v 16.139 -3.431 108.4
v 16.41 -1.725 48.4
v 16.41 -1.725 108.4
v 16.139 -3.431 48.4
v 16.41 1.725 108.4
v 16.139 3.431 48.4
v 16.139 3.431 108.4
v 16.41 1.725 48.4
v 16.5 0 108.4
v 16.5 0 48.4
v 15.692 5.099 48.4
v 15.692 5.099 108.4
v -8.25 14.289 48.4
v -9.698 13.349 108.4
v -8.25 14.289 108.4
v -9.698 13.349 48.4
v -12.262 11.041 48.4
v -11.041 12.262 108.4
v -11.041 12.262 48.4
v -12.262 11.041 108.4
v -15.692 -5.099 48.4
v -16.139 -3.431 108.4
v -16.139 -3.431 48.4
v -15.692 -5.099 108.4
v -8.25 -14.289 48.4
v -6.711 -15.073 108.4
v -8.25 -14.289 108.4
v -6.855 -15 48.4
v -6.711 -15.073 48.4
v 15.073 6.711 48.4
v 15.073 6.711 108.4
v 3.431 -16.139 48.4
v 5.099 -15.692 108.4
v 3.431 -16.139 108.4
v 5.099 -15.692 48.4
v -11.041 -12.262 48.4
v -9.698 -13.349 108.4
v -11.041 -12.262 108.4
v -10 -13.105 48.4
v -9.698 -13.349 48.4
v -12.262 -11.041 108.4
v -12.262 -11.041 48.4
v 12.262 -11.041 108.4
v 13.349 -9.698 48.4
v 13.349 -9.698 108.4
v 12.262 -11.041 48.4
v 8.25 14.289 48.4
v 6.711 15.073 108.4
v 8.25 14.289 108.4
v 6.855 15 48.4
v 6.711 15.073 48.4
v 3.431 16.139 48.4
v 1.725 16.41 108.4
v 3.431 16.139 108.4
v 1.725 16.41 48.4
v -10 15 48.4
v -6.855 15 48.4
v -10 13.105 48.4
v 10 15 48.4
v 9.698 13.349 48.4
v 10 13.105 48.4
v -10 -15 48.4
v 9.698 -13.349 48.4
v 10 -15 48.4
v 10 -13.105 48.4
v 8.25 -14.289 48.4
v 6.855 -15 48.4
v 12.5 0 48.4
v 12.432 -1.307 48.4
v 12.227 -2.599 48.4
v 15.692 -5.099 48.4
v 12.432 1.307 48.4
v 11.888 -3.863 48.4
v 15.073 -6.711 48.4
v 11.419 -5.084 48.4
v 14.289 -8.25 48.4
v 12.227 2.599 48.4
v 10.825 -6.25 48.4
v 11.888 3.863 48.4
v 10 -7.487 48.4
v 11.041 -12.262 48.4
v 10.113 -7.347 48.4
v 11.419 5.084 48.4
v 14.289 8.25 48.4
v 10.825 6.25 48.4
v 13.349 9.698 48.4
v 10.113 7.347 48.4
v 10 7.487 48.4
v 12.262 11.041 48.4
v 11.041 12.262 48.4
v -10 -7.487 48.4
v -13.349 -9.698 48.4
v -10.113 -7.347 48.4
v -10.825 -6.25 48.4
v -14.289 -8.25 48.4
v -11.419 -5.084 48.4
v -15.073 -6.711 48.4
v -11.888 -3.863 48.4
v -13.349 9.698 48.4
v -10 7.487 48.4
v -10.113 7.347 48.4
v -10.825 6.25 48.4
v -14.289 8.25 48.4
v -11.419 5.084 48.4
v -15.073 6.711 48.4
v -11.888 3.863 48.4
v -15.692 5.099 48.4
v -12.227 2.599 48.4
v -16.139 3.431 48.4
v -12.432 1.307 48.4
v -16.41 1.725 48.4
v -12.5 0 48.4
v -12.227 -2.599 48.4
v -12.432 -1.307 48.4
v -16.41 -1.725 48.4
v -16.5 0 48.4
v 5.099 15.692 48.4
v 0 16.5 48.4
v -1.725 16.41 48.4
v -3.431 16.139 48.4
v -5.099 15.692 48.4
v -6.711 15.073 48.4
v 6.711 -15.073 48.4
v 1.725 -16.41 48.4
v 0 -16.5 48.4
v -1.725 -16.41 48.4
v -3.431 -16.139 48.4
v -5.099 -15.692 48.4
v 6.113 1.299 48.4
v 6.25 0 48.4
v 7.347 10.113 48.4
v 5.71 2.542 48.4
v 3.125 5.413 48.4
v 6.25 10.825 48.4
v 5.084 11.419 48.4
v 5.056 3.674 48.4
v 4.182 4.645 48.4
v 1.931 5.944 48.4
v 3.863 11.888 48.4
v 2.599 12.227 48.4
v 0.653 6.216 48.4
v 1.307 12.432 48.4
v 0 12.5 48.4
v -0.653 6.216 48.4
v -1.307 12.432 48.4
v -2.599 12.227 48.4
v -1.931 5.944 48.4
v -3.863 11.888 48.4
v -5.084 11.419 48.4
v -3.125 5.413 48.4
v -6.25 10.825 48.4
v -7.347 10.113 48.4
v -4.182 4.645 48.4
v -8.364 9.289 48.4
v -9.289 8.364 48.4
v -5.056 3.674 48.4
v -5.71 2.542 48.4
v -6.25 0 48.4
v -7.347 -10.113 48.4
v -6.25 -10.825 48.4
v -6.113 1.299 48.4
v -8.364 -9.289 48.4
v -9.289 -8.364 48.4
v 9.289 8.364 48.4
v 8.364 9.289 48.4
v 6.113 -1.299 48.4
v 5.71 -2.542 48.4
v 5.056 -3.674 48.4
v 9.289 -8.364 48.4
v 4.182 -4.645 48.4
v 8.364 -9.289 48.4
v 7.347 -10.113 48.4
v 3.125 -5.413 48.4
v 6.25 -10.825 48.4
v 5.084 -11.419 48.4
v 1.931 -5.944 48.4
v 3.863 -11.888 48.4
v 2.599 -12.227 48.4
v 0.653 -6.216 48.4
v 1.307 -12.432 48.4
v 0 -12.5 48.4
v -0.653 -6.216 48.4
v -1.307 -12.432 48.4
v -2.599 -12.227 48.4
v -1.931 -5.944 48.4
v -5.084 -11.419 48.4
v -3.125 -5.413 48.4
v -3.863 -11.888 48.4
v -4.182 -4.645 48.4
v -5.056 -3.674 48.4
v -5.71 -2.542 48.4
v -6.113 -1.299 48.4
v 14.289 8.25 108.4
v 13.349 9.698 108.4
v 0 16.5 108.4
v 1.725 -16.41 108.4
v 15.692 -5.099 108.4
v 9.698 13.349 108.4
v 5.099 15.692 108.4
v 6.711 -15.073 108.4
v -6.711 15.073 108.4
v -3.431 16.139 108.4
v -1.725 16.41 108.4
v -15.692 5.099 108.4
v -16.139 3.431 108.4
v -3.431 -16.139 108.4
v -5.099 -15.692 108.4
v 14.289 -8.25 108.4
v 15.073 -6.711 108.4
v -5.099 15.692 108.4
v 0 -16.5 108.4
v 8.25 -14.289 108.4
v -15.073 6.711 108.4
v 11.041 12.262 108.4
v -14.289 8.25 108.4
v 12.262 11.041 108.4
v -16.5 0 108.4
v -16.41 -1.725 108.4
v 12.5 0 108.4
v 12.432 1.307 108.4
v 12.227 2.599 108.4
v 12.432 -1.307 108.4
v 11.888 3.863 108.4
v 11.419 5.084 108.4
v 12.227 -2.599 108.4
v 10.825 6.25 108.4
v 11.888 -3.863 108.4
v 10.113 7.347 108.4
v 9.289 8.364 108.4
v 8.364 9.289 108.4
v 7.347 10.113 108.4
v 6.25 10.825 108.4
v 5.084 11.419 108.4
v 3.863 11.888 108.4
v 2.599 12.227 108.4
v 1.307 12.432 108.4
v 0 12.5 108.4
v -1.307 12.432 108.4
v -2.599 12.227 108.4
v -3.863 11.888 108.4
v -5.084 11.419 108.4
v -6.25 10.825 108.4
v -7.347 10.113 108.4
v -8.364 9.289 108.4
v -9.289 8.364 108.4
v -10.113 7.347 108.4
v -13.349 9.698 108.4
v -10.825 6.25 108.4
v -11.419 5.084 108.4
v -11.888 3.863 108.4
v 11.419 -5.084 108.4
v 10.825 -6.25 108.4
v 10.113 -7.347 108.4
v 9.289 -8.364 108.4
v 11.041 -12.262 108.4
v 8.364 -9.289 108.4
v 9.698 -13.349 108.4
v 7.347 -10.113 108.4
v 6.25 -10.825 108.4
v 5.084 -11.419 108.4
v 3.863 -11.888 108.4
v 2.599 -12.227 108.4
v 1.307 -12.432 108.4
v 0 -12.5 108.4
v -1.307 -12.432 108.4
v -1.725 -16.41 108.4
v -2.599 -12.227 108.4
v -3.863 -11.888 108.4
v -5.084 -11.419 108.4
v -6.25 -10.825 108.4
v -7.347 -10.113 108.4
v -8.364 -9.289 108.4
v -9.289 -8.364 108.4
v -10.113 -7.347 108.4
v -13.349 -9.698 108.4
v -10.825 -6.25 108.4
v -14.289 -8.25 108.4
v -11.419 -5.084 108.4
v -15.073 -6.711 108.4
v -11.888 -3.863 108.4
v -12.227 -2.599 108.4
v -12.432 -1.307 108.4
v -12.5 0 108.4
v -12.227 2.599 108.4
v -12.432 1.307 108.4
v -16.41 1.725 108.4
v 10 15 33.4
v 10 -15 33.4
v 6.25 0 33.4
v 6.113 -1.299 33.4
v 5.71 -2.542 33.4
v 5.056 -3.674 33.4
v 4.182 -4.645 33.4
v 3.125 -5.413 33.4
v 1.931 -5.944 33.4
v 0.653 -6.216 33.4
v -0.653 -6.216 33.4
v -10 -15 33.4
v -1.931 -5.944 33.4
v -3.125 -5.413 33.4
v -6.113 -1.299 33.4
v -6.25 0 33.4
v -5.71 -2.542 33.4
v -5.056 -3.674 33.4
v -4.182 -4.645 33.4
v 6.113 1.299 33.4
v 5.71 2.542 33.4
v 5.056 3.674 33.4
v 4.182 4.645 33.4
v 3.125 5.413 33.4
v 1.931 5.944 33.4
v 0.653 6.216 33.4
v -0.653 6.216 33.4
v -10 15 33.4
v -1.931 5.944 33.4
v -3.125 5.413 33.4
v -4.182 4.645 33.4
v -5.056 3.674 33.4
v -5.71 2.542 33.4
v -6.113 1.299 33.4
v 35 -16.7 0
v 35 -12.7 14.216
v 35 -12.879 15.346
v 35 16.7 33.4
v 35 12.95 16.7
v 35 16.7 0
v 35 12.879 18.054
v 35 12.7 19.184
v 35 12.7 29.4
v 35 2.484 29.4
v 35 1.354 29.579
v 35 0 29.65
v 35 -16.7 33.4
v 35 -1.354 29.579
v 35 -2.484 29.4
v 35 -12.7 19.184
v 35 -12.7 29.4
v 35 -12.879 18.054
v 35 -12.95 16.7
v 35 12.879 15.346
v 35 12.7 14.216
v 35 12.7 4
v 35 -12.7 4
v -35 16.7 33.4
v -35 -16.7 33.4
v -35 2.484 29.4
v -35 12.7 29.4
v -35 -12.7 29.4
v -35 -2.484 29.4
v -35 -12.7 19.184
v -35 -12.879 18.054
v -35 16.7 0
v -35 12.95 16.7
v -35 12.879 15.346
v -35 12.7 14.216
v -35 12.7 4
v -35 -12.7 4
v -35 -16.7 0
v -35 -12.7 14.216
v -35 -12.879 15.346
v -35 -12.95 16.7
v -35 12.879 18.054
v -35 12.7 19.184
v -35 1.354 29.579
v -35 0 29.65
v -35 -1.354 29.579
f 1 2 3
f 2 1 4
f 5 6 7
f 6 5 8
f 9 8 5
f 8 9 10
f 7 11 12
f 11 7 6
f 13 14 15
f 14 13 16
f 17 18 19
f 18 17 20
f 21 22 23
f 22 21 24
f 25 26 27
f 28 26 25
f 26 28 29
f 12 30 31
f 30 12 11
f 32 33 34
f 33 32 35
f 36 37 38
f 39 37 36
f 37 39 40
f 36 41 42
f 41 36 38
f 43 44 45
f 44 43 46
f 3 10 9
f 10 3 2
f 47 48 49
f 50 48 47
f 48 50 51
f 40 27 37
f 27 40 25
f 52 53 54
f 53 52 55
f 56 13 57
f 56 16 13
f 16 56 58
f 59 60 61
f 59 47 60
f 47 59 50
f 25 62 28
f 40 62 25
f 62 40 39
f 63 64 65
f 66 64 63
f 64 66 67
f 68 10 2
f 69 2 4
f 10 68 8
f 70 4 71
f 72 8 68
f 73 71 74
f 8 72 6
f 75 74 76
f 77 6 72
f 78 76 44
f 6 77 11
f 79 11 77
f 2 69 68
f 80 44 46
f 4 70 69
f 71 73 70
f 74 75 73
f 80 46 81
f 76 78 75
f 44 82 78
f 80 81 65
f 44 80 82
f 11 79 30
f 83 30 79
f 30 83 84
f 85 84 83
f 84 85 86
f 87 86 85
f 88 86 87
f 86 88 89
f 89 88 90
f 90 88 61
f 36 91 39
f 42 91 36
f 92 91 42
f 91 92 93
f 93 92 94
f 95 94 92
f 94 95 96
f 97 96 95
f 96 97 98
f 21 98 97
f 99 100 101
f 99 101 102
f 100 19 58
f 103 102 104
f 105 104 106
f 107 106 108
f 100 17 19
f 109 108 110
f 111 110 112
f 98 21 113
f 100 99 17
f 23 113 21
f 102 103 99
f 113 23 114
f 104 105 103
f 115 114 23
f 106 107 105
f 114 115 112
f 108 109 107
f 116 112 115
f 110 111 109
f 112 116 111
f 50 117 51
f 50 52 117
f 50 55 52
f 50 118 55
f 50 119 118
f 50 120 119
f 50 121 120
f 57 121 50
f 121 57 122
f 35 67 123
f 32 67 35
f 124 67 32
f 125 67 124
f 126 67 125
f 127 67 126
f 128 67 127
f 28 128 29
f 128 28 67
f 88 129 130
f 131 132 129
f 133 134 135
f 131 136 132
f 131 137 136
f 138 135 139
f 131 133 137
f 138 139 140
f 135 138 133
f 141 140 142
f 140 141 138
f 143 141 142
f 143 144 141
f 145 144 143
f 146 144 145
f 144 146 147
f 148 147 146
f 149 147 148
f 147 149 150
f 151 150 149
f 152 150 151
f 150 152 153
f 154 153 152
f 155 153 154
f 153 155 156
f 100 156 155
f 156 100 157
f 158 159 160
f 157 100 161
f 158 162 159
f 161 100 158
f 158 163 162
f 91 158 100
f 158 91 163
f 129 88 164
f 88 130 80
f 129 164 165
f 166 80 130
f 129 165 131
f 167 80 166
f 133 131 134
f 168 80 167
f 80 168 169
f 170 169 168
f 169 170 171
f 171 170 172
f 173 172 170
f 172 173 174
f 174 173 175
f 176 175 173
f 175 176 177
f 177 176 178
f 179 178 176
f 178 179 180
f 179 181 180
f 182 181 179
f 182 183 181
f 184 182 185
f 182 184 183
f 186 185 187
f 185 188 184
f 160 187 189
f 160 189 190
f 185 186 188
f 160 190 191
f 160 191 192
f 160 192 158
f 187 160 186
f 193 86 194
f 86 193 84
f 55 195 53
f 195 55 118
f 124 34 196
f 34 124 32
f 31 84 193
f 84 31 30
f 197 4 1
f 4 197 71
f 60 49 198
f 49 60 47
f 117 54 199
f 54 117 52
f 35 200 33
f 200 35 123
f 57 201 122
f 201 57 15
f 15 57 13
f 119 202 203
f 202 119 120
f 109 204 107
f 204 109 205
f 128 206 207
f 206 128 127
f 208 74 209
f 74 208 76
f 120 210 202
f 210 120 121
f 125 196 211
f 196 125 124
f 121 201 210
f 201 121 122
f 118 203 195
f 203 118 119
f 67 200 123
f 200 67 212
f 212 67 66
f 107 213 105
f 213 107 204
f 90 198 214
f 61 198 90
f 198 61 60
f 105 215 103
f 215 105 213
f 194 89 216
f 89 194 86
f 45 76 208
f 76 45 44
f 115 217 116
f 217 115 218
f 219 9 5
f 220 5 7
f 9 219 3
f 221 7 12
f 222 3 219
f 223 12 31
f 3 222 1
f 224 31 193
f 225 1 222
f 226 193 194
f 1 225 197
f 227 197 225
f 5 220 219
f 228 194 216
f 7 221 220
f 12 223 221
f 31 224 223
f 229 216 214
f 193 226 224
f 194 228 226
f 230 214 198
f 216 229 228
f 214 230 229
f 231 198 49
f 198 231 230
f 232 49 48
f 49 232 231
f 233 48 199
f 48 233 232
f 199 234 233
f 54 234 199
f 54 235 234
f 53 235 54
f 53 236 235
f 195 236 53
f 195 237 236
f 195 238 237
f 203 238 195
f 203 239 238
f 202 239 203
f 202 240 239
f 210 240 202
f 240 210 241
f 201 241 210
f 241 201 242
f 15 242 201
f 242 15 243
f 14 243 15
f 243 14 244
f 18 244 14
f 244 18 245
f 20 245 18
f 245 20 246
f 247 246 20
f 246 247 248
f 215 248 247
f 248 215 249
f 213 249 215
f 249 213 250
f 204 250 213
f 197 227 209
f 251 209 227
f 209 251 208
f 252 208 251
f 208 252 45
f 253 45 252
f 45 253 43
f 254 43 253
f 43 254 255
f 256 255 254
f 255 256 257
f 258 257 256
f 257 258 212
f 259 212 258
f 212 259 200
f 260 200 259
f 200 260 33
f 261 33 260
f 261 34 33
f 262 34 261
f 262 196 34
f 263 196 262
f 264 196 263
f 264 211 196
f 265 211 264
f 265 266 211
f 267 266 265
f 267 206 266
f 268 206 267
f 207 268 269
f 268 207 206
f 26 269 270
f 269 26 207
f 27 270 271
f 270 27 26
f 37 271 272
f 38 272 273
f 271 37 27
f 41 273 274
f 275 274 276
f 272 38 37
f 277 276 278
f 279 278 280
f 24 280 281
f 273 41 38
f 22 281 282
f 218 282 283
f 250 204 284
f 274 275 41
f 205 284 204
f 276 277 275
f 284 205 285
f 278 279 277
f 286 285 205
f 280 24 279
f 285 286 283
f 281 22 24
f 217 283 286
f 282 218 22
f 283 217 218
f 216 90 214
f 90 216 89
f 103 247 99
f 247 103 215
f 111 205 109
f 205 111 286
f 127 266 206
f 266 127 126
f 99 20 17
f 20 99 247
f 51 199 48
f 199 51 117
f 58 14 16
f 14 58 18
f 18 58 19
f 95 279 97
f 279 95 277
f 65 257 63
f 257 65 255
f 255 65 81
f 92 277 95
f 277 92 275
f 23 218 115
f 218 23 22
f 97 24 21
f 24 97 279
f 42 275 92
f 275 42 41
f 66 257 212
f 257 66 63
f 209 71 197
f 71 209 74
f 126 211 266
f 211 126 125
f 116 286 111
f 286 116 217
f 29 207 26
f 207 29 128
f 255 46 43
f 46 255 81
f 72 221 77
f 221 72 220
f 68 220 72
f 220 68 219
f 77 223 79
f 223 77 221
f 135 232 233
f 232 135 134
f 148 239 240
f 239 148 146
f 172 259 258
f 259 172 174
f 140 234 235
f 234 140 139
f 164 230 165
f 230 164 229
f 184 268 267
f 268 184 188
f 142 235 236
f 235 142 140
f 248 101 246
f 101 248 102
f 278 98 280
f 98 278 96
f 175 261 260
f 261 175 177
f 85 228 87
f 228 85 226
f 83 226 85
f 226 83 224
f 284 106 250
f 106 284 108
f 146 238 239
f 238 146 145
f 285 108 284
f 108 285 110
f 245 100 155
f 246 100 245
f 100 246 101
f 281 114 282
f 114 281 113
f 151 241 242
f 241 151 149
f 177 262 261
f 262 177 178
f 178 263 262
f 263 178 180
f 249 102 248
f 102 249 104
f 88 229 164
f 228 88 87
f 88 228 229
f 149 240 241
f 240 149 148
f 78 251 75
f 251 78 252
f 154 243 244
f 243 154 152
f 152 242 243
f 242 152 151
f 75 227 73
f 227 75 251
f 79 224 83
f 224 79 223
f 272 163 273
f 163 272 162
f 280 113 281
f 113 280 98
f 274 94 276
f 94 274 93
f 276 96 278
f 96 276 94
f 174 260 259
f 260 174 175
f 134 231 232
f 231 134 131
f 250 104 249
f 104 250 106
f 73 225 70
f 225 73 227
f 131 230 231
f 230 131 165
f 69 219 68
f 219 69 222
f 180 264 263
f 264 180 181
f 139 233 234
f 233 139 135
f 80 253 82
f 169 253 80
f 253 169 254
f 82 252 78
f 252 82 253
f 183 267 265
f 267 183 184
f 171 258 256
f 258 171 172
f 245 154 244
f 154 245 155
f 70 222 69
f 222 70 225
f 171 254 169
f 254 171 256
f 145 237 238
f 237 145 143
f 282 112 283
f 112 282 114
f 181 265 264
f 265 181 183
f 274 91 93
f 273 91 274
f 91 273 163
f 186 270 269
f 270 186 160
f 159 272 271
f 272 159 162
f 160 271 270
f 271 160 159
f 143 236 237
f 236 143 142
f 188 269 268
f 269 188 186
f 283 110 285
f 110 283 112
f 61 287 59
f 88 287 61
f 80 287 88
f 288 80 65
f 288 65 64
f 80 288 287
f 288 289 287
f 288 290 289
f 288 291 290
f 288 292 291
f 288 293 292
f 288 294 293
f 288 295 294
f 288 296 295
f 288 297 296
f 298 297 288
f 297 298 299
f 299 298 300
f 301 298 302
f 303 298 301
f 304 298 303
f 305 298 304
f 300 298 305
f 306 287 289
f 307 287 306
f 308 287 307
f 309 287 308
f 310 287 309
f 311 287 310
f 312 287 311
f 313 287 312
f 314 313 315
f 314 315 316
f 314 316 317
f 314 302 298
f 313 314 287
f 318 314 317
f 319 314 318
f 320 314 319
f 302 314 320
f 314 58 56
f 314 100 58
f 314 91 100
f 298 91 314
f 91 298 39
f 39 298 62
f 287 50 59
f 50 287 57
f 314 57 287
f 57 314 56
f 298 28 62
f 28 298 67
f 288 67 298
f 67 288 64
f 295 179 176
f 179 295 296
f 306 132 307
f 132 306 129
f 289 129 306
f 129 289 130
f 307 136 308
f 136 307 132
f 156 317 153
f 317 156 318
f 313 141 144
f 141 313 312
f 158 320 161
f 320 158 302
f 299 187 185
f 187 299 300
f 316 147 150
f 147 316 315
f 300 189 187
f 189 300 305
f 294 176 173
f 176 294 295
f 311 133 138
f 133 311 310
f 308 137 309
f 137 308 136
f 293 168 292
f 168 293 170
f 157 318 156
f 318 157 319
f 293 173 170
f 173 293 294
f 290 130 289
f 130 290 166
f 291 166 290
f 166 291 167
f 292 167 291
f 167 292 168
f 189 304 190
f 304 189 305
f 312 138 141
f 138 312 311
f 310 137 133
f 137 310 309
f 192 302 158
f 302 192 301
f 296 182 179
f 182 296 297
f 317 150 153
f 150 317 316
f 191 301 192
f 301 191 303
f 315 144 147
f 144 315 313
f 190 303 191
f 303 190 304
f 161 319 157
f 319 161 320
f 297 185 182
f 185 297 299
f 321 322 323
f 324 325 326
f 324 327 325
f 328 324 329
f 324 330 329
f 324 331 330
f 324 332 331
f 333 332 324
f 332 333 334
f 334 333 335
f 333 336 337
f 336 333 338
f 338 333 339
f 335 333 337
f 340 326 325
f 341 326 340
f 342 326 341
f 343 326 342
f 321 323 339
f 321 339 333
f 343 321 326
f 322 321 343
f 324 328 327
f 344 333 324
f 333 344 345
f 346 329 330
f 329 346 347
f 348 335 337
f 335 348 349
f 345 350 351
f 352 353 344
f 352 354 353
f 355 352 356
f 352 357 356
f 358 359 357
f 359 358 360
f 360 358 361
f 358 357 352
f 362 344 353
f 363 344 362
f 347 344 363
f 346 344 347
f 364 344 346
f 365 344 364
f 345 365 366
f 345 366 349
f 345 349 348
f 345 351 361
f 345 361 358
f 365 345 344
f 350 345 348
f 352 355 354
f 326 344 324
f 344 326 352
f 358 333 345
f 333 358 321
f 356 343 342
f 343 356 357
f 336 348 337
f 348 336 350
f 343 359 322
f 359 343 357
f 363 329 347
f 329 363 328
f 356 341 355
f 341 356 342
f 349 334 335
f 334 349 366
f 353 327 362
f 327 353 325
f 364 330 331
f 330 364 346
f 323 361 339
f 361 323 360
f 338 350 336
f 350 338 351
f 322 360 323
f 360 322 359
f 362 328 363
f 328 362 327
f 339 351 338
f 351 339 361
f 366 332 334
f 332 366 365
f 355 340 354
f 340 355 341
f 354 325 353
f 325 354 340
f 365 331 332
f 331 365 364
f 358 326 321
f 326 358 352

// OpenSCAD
// Bike Umbrella Holder
// By Claude, March 28, 2025

/* Parameters */
// Umbrella holder
umbrella_diameter = 25; // Diameter of umbrella shaft
umbrella_holder_thickness = 4; // Wall thickness of the umbrella holder
umbrella_holder_height = 60; // Height of umbrella cylinder

// Handlebar dimensions
handlebar_diameter = 25.4; // Standard handlebar diameter (1 inch)
bracket_length = 70; // Length of the bracket along the handlebar
bracket_thickness = 4; // Wall thickness of bracket

// Connector between umbrella holder and handlebar mount
connector_length = 30; // Length of connector piece
connector_width = 20; // Width of connector piece
connector_height = 15; // Height of connector

// Screw holes
screw_diameter = 6; // M6 screws
washer_diameter = 12; // Washer diameter
screw_positions = [ // Positions of the four screws
    [bracket_length/4, -handlebar_diameter/2 - bracket_thickness - 10],
    [bracket_length*3/4, -handlebar_diameter/2 - bracket_thickness - 10],
    [bracket_length/4, handlebar_diameter/2 + bracket_thickness + 10],
    [bracket_length*3/4, handlebar_diameter/2 + bracket_thickness + 10]
];

// Clearance for easier assembly
tolerance = 0.5;

/* Main Module */
module bike_umbrella_holder() {
    // Umbrella holder (vertical cylinder)
    translate([0, 0, connector_height + handlebar_diameter + bracket_thickness*2])
    umbrella_holder();

    // Connector between umbrella holder and handlebar mount
    translate([-connector_width/2, -connector_length/2, handlebar_diameter + bracket_thickness*2])
    connector();

    // Handlebar mount (upper and lower brackets)
    handlebar_mount();
}

/* Umbrella Holder Module */
module umbrella_holder() {
    difference() {
        // Outer cylinder
        cylinder(h=umbrella_holder_height, d=umbrella_diameter + umbrella_holder_thickness*2, $fn=60);

        // Inner cylinder (hole for umbrella)
        translate([0, 0, -1])
        cylinder(h=umbrella_holder_height+2, d=umbrella_diameter, $fn=60);
    }
}

/* Connector Module */
module connector() {
    difference() {
        // Connector body
        cube([connector_width, connector_length, connector_height]);

        // Hole for umbrella shaft (vertical alignment)
        translate([connector_width/2, connector_length/2, -1])
        cylinder(h=connector_height+2, d=umbrella_diameter/2, $fn=30);
    }
}

/* Handlebar Mount Module */
module handlebar_mount() {
    difference() {
        union() {
            // Upper bracket
            translate([-bracket_length/2, -handlebar_diameter/2 - bracket_thickness, handlebar_diameter + bracket_thickness])
            cube([bracket_length, handlebar_diameter + bracket_thickness*2, bracket_thickness]);

            // Lower bracket
            translate([-bracket_length/2, -handlebar_diameter/2 - bracket_thickness, 0])
            cube([bracket_length, handlebar_diameter + bracket_thickness*2, bracket_thickness]);

            // Side supports for upper bracket
            translate([-bracket_length/2, -handlebar_diameter/2 - bracket_thickness, bracket_thickness])
            cube([bracket_length, bracket_thickness, handlebar_diameter]);

            translate([-bracket_length/2, handlebar_diameter/2, bracket_thickness])
            cube([bracket_length, bracket_thickness, handlebar_diameter]);
        }

        // Cutout for handlebar
        translate([0, 0, bracket_thickness + handlebar_diameter/2])
        rotate([0, 90, 0])
        cylinder(h=bracket_length + 2, d=handlebar_diameter + tolerance, center=true, $fn=60);

        // Screw holes
        for (pos = screw_positions) {
            // Main screw holes
            translate([pos[0] - bracket_length/2, pos[1], -1])
            cylinder(h=bracket_thickness + handlebar_diameter + bracket_thickness + 2, d=screw_diameter, $fn=30);

            // Countersink for washer in lower bracket
            translate([pos[0] - bracket_length/2, pos[1], 0])
            cylinder(h=2, d=washer_diameter, $fn=30);

            // Countersink for washer in upper bracket
            translate([pos[0] - bracket_length/2, pos[1], handlebar_diameter + bracket_thickness - 2 + bracket_thickness])
            cylinder(h=2, d=washer_diameter, $fn=30);
        }
    }
}

/* Render the model */
//bike_umbrella_holder();

// Uncomment below to see the upper and lower parts separately for printing

module upperpart() {
// Upper part (umbrella holder and connector)
translate([0, 0, 0]) {
   translate([0, 0, connector_height + handlebar_diameter + bracket_thickness*2])
   umbrella_holder();

   translate([-connector_width/2, -connector_length/2, handlebar_diameter + bracket_thickness*2])
   connector();

   difference() {
       union() {
           // Upper bracket
           translate([-bracket_length/2, -handlebar_diameter/2 - bracket_thickness, handlebar_diameter + bracket_thickness])
           cube([bracket_length, handlebar_diameter + bracket_thickness*2, bracket_thickness]);

           // Side supports for upper bracket
           translate([-bracket_length/2, -handlebar_diameter/2 - bracket_thickness, bracket_thickness])
           cube([bracket_length, bracket_thickness, handlebar_diameter]);

           translate([-bracket_length/2, handlebar_diameter/2, bracket_thickness])
           cube([bracket_length, bracket_thickness, handlebar_diameter]);
       }

       // Cutout for handlebar
       translate([0, 0, bracket_thickness + handlebar_diameter/2])
       rotate([0, 90, 0])
       cylinder(h=bracket_length + 2, d=handlebar_diameter + tolerance, center=true, $fn=60);

       // Screw holes
       for (pos = screw_positions) {
           translate([pos[0] - bracket_length/2, pos[1], -1])
           cylinder(h=bracket_thickness + handlebar_diameter + bracket_thickness + 2, d=screw_diameter, $fn=30);

           translate([pos[0] - bracket_length/2, pos[1], handlebar_diameter + bracket_thickness - 2 + bracket_thickness])
           cylinder(h=2, d=washer_diameter, $fn=30);
       }
   }
}
}

upperpart();

module lowerpart() {
// Lower part (just the bottom bracket)
translate([0, 0, 0]) {
    difference() {
        // Lower bracket
        translate([-bracket_length/2, -handlebar_diameter/2 - bracket_thickness, 0])
        cube([bracket_length, handlebar_diameter + bracket_thickness*2, bracket_thickness]);

        // Screw holes with countersink
        for (pos = screw_positions) {
            translate([pos[0] - bracket_length/2, pos[1], -1])
            cylinder(h=bracket_thickness + 2, d=screw_diameter, $fn=30);

            translate([pos[0] - bracket_length/2, pos[1], 0])
            cylinder(h=2, d=washer_diameter, $fn=30);
        }
    }
}
}

lowerpart();
